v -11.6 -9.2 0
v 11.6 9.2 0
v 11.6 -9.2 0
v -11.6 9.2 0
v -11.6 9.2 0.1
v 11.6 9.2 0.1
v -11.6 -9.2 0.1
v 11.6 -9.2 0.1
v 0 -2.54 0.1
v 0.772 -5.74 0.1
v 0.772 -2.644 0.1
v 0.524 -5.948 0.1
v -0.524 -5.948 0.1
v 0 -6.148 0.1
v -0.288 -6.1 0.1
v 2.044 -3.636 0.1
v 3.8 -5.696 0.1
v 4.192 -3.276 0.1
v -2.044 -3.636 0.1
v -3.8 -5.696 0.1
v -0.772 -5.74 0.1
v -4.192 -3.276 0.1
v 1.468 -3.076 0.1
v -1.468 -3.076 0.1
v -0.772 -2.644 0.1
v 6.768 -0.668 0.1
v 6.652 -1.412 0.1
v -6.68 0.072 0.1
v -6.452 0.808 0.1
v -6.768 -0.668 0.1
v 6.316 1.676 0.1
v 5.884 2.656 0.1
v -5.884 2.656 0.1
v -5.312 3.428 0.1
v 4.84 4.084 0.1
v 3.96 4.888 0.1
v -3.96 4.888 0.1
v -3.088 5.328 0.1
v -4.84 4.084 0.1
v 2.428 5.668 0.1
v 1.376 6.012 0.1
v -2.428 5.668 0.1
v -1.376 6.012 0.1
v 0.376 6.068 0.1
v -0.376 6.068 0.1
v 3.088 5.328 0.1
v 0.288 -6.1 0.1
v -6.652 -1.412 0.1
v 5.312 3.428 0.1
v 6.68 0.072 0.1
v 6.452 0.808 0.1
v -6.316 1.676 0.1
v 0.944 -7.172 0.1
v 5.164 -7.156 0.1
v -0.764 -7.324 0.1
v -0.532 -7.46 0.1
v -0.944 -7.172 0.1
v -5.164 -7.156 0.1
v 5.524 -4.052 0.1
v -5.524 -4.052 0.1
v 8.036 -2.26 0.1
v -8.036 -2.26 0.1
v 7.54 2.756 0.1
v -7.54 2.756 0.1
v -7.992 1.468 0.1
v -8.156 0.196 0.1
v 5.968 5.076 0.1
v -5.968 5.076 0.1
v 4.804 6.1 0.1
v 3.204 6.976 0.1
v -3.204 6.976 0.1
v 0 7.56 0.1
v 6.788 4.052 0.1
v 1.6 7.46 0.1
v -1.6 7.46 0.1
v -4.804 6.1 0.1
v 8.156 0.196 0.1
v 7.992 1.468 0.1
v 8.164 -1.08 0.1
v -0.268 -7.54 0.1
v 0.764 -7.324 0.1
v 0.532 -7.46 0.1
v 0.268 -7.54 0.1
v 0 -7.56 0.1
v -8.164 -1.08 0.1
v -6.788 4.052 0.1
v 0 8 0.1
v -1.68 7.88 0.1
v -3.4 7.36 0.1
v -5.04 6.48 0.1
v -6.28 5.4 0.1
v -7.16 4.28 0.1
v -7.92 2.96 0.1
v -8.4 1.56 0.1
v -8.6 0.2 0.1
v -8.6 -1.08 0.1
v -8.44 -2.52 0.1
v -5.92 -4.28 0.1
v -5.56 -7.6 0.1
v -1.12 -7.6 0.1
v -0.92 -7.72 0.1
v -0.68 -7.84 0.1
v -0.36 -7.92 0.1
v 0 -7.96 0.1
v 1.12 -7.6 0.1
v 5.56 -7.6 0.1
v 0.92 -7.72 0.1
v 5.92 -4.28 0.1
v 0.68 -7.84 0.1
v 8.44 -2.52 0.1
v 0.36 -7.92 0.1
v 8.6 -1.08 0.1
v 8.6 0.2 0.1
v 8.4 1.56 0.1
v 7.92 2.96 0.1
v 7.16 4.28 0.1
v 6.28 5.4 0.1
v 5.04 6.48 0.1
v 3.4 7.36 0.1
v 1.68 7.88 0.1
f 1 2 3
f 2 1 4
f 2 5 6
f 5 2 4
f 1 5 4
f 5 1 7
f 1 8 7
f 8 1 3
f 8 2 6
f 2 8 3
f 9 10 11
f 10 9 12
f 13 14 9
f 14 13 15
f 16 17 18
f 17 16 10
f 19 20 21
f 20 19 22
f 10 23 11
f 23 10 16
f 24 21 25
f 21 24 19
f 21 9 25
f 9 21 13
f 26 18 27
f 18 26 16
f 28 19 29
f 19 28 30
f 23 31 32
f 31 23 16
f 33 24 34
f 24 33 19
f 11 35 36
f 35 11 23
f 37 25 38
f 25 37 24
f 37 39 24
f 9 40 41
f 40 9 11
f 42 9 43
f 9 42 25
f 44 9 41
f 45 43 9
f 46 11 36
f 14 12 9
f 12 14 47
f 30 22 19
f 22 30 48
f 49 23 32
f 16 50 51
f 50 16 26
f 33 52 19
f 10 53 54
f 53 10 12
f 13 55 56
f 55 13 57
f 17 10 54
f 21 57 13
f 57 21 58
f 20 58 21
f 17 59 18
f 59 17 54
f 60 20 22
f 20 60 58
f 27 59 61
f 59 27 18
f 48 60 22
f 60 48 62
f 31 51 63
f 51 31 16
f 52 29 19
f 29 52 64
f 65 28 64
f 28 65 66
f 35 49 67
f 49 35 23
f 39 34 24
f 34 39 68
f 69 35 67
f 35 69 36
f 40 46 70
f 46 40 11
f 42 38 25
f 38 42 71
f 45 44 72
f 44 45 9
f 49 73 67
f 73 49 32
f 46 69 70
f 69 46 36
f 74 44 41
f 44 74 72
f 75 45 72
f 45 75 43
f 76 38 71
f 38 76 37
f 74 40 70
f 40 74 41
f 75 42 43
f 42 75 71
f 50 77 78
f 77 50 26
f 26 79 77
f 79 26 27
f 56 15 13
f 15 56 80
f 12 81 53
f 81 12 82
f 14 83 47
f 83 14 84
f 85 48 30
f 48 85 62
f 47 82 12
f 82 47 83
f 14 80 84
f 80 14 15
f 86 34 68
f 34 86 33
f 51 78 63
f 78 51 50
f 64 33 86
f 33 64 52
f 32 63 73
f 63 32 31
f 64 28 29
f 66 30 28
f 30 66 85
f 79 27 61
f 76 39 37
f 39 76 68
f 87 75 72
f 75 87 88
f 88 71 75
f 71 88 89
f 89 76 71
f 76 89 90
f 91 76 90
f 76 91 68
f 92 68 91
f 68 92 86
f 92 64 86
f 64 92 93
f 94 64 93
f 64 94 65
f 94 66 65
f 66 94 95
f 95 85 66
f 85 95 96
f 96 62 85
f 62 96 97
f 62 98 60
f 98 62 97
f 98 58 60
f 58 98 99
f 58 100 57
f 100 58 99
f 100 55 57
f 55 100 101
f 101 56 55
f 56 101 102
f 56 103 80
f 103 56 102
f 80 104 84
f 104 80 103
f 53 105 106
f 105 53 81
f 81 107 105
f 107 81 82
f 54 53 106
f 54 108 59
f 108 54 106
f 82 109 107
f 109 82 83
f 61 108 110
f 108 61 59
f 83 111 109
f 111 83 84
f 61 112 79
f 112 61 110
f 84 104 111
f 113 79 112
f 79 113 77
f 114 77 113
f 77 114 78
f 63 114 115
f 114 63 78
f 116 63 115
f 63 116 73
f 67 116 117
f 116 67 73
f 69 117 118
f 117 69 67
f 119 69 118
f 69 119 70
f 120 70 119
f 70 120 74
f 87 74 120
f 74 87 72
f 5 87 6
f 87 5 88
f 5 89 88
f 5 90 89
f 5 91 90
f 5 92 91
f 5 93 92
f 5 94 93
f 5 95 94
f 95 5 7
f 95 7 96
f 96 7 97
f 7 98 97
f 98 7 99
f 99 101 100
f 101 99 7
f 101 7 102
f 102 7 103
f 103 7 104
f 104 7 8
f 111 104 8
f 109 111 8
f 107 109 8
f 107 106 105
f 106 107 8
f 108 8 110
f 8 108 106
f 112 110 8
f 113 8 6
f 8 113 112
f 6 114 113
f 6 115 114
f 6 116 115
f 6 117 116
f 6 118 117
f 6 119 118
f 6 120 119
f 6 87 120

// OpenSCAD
// file: ../p/box5-12.scad
use <../lib.scad>
function ldraw_lib__box5_12() = [
// 0 Box with 5 Faces without Any Edges
// 0 Name: box5-12.dat
// 0 Author: Chris Dee [cwdee]
// 0 !LDRAW_ORG Primitive UPDATE 2009-02
// 0 !LICENSE Licensed under CC BY 2.0 and CC BY 4.0 : see CAreadme.txt
// 
// 0 BFC CERTIFY CCW
  [0,"BFC","CERTIFY"],
  [0,"BFC","CCW"],
// 
// 0 !HISTORY 2009-09-03 [PTadmin] Official Update 2009-02
// 
// 
// 4 16 1 1 1 1 1 -1 -1 1 -1 -1 1 1
  [4,16,1,1,1,1,1,-1,-1,1,-1,-1,1,1],
// 4 16 -1 0 1 1 0 1 1 1 1 -1 1 1
  [4,16,-1,0,1,1,0,1,1,1,1,-1,1,1],
// 4 16 -1 0 -1 -1 0 1 -1 1 1 -1 1 -1
  [4,16,-1,0,-1,-1,0,1,-1,1,1,-1,1,-1],
// 4 16 1 0 -1 -1 0 -1 -1 1 -1 1 1 -1
  [4,16,1,0,-1,-1,0,-1,-1,1,-1,1,1,-1],
// 4 16 1 0 1 1 0 -1 1 1 -1 1 1 1
  [4,16,1,0,1,1,0,-1,1,1,-1,1,1,1],
// 0
];
makepoly(ldraw_lib__box5_12(), line=0.2);
// main file
use <../lib.scad>
use <../p/box5-12.scad>
function ldraw_lib__190155i() = [
// 0 Sticker  2.3 x  2.9 with Shell Logo on Red Background
// 0 Name: 190155i.dat
// 0 Author: Takeshi Takahashi [RainbowDolphin]
// 0 !LDRAW_ORG Part UPDATE 2022-06
// 0 !LICENSE Licensed under CC BY 2.0 and CC BY 4.0 : see CAreadme.txt
// 
// 0 BFC CERTIFY CCW
  [0,"BFC","CERTIFY"],
  [0,"BFC","CCW"],
// 
// 0 !KEYWORDS Bricklink 6378stk01, Brickowl 150076, Rebrickable 190155
// 0 !KEYWORDS Service station, Set 6378, Signboard
// 
// 0 !HISTORY 2022-12-20 [PTadmin] Official Update 2022-06
// 
// 
// 1 16 0 -0.25 0 29 0 0 0 0.25 0 0 0 23 box5-12.dat
  [1,16,0,-0.25,0,29,0,0,0,0.25,0,0,0,23, ldraw_lib__box5_12()],
// 4 14 0 -0.25 -6.35 1.31 -0.25 -14.87 1.93 -0.25 -14.35 1.93 -0.25 -6.61
  [4,14,0,-0.25,-6.35,1.31,-0.25,-14.87,1.93,-0.25,-14.35,1.93,-0.25,-6.61],
// 4 14 -0.72 -0.25 -15.25 0 -0.25 -15.37 0 -0.25 -6.35 -1.31 -0.25 -14.87
  [4,14,-0.72,-0.25,-15.25,0,-0.25,-15.37,0,-0.25,-6.35,-1.31,-0.25,-14.87],
// 4 14 9.5 -0.25 -14.24 10.48 -0.25 -8.189 5.11 -0.25 -9.09 1.93 -0.25 -14.35
  [4,14,9.5,-0.25,-14.24,10.48,-0.25,-8.189,5.11,-0.25,-9.09,1.93,-0.25,-14.35],
// 4 14 -10.48 -0.25 -8.189 -9.5 -0.25 -14.24 -1.93 -0.25 -14.35 -5.11 -0.25 -9.09
  [4,14,-10.48,-0.25,-8.189,-9.5,-0.25,-14.24,-1.93,-0.25,-14.35,-5.11,-0.25,-9.09],
// 4 14 1.93 -0.25 -14.35 5.11 -0.25 -9.09 3.67 -0.25 -7.69 1.93 -0.25 -6.61
  [4,14,1.93,-0.25,-14.35,5.11,-0.25,-9.09,3.67,-0.25,-7.69,1.93,-0.25,-6.61],
// 4 14 -3.67 -0.25 -7.69 -5.11 -0.25 -9.09 -1.93 -0.25 -14.35 -1.93 -0.25 -6.61
  [4,14,-3.67,-0.25,-7.69,-5.11,-0.25,-9.09,-1.93,-0.25,-14.35,-1.93,-0.25,-6.61],
// 4 14 0 -0.25 -6.35 -1.93 -0.25 -6.61 -1.93 -0.25 -14.35 -1.31 -0.25 -14.87
  [4,14,0,-0.25,-6.35,-1.93,-0.25,-6.61,-1.93,-0.25,-14.35,-1.31,-0.25,-14.87],
// 4 14 5.11 -0.25 -9.09 10.48 -0.25 -8.189 16.63 -0.25 -3.53 16.92 -0.25 -1.67
  [4,14,5.11,-0.25,-9.09,10.48,-0.25,-8.189,16.63,-0.25,-3.53,16.92,-0.25,-1.67],
// 4 14 -5.11 -0.25 -9.09 -16.129 -0.25 2.02 -16.7 -0.25 0.18 -16.92 -0.25 -1.67
  [4,14,-5.11,-0.25,-9.09,-16.129,-0.25,2.02,-16.7,-0.25,0.18,-16.92,-0.25,-1.67],
// 4 14 3.67 -0.25 -7.69 5.11 -0.25 -9.09 15.79 -0.25 4.19 14.71 -0.25 6.64
  [4,14,3.67,-0.25,-7.69,5.11,-0.25,-9.09,15.79,-0.25,4.19,14.71,-0.25,6.64],
// 4 14 -3.67 -0.25 -7.69 -13.28 -0.25 8.57 -14.71 -0.25 6.64 -5.11 -0.25 -9.09
  [4,14,-3.67,-0.25,-7.69,-13.28,-0.25,8.57,-14.71,-0.25,6.64,-5.11,-0.25,-9.09],
// 4 14 1.93 -0.25 -6.61 3.67 -0.25 -7.69 12.1 -0.25 10.21 9.9 -0.25 12.22
  [4,14,1.93,-0.25,-6.61,3.67,-0.25,-7.69,12.1,-0.25,10.21,9.9,-0.25,12.22],
// 4 14 -1.93 -0.25 -6.61 -7.72 -0.25 13.32 -9.9 -0.25 12.22 -3.67 -0.25 -7.69
  [4,14,-1.93,-0.25,-6.61,-7.72,-0.25,13.32,-9.9,-0.25,12.22,-3.67,-0.25,-7.69],
// 3 14 -9.9 -0.25 12.22 -12.1 -0.25 10.21 -3.67 -0.25 -7.69
  [3,14,-9.9,-0.25,12.22,-12.1,-0.25,10.21,-3.67,-0.25,-7.69],
// 4 14 0 -0.25 -6.35 1.93 -0.25 -6.61 6.07 -0.25 14.17 3.44 -0.25 15.03
  [4,14,0,-0.25,-6.35,1.93,-0.25,-6.61,6.07,-0.25,14.17,3.44,-0.25,15.03],
// 4 14 -6.07 -0.25 14.17 -1.93 -0.25 -6.61 0 -0.25 -6.35 -3.44 -0.25 15.03
  [4,14,-6.07,-0.25,14.17,-1.93,-0.25,-6.61,0,-0.25,-6.35,-3.44,-0.25,15.03],
// 3 14 0.94 -0.25 15.17 0 -0.25 -6.35 3.44 -0.25 15.03
  [3,14,0.94,-0.25,15.17,0,-0.25,-6.35,3.44,-0.25,15.03],
// 3 14 -0.94 -0.25 15.17 -3.44 -0.25 15.03 0 -0.25 -6.35
  [3,14,-0.94,-0.25,15.17,-3.44,-0.25,15.03,0,-0.25,-6.35],
// 3 14 7.72 -0.25 13.32 1.93 -0.25 -6.61 9.9 -0.25 12.22
  [3,14,7.72,-0.25,13.32,1.93,-0.25,-6.61,9.9,-0.25,12.22],
// 4 14 0.72 -0.25 -15.25 1.31 -0.25 -14.87 0 -0.25 -6.35 0 -0.25 -15.37
  [4,14,0.72,-0.25,-15.25,1.31,-0.25,-14.87,0,-0.25,-6.35,0,-0.25,-15.37],
// 4 14 -5.11 -0.25 -9.09 -16.92 -0.25 -1.67 -16.63 -0.25 -3.53 -10.48 -0.25 -8.189
  [4,14,-5.11,-0.25,-9.09,-16.92,-0.25,-1.67,-16.63,-0.25,-3.53,-10.48,-0.25,-8.189],
// 3 14 13.28 -0.25 8.57 3.67 -0.25 -7.69 14.71 -0.25 6.64
  [3,14,13.28,-0.25,8.57,3.67,-0.25,-7.69,14.71,-0.25,6.64],
// 4 14 16.7 -0.25 0.18 16.129 -0.25 2.02 5.11 -0.25 -9.09 16.92 -0.25 -1.67
  [4,14,16.7,-0.25,0.18,16.129,-0.25,2.02,5.11,-0.25,-9.09,16.92,-0.25,-1.67],
// 3 14 -14.71 -0.25 6.64 -15.79 -0.25 4.19 -5.11 -0.25 -9.09
  [3,14,-14.71,-0.25,6.64,-15.79,-0.25,4.19,-5.11,-0.25,-9.09],
// 4 4 1.93 -0.25 -14.35 1.31 -0.25 -14.87 2.36 -0.25 -17.93 12.91 -0.25 -17.89
  [4,4,1.93,-0.25,-14.35,1.31,-0.25,-14.87,2.36,-0.25,-17.93,12.91,-0.25,-17.89],
// 4 4 -1.91 -0.25 -18.31 -1.33 -0.25 -18.65 -1.31 -0.25 -14.87 -2.36 -0.25 -17.93
  [4,4,-1.91,-0.25,-18.31,-1.33,-0.25,-18.65,-1.31,-0.25,-14.87,-2.36,-0.25,-17.93],
// 3 4 9.5 -0.25 -14.24 1.93 -0.25 -14.35 12.91 -0.25 -17.89
  [3,4,9.5,-0.25,-14.24,1.93,-0.25,-14.35,12.91,-0.25,-17.89],
// 4 4 -1.31 -0.25 -14.87 -1.93 -0.25 -14.35 -12.91 -0.25 -17.89 -2.36 -0.25 -17.93
  [4,4,-1.31,-0.25,-14.87,-1.93,-0.25,-14.35,-12.91,-0.25,-17.89,-2.36,-0.25,-17.93],
// 3 4 -9.5 -0.25 -14.24 -12.91 -0.25 -17.89 -1.93 -0.25 -14.35
  [3,4,-9.5,-0.25,-14.24,-12.91,-0.25,-17.89,-1.93,-0.25,-14.35],
// 4 4 13.81 -0.25 -10.13 10.48 -0.25 -8.189 9.5 -0.25 -14.24 12.91 -0.25 -17.89
  [4,4,13.81,-0.25,-10.13,10.48,-0.25,-8.189,9.5,-0.25,-14.24,12.91,-0.25,-17.89],
// 4 4 -10.48 -0.25 -8.189 -13.81 -0.25 -10.13 -12.91 -0.25 -17.89 -9.5 -0.25 -14.24
  [4,4,-10.48,-0.25,-8.189,-13.81,-0.25,-10.13,-12.91,-0.25,-17.89,-9.5,-0.25,-14.24],
// 4 4 20.09 -0.25 -5.65 16.63 -0.25 -3.53 10.48 -0.25 -8.189 13.81 -0.25 -10.13
  [4,4,20.09,-0.25,-5.65,16.63,-0.25,-3.53,10.48,-0.25,-8.189,13.81,-0.25,-10.13],
// 4 4 -10.48 -0.25 -8.189 -16.63 -0.25 -3.53 -20.09 -0.25 -5.65 -13.81 -0.25 -10.13
  [4,4,-10.48,-0.25,-8.189,-16.63,-0.25,-3.53,-20.09,-0.25,-5.65,-13.81,-0.25,-10.13],
// 4 4 15.79 -0.25 4.19 5.11 -0.25 -9.09 16.129 -0.25 2.02 18.85 -0.25 6.89
  [4,4,15.79,-0.25,4.19,5.11,-0.25,-9.09,16.129,-0.25,2.02,18.85,-0.25,6.89],
// 4 4 -16.129 -0.25 2.02 -5.11 -0.25 -9.09 -15.79 -0.25 4.19 -18.85 -0.25 6.89
  [4,4,-16.129,-0.25,2.02,-5.11,-0.25,-9.09,-15.79,-0.25,4.19,-18.85,-0.25,6.89],
// 4 4 -19.98 -0.25 3.67 -20.39 -0.25 0.49 -16.7 -0.25 0.18 -18.85 -0.25 6.89
  [4,4,-19.98,-0.25,3.67,-20.39,-0.25,0.49,-16.7,-0.25,0.18,-18.85,-0.25,6.89],
// 4 4 12.1 -0.25 10.21 3.67 -0.25 -7.69 13.28 -0.25 8.57 14.92 -0.25 12.69
  [4,4,12.1,-0.25,10.21,3.67,-0.25,-7.69,13.28,-0.25,8.57,14.92,-0.25,12.69],
// 4 4 -13.28 -0.25 8.57 -3.67 -0.25 -7.69 -12.1 -0.25 10.21 -14.92 -0.25 12.69
  [4,4,-13.28,-0.25,8.57,-3.67,-0.25,-7.69,-12.1,-0.25,10.21,-14.92,-0.25,12.69],
// 4 4 12.1 -0.25 10.21 14.92 -0.25 12.69 12.01 -0.25 15.25 9.9 -0.25 12.22
  [4,4,12.1,-0.25,10.21,14.92,-0.25,12.69,12.01,-0.25,15.25,9.9,-0.25,12.22],
// 4 4 6.07 -0.25 14.17 1.93 -0.25 -6.61 7.72 -0.25 13.32 8.01 -0.25 17.44
  [4,4,6.07,-0.25,14.17,1.93,-0.25,-6.61,7.72,-0.25,13.32,8.01,-0.25,17.44],
// 4 4 -7.72 -0.25 13.32 -1.93 -0.25 -6.61 -6.07 -0.25 14.17 -8.01 -0.25 17.44
  [4,4,-7.72,-0.25,13.32,-1.93,-0.25,-6.61,-6.07,-0.25,14.17,-8.01,-0.25,17.44],
// 4 4 0 -0.25 -6.35 0.94 -0.25 15.17 0 -0.25 18.9 -0.94 -0.25 15.17
  [4,4,0,-0.25,-6.35,0.94,-0.25,15.17,0,-0.25,18.9,-0.94,-0.25,15.17],
// 4 4 16.97 -0.25 10.13 14.92 -0.25 12.69 13.28 -0.25 8.57 14.71 -0.25 6.64
  [4,4,16.97,-0.25,10.13,14.92,-0.25,12.69,13.28,-0.25,8.57,14.71,-0.25,6.64],
// 4 4 12.01 -0.25 15.25 8.01 -0.25 17.44 7.72 -0.25 13.32 9.9 -0.25 12.22
  [4,4,12.01,-0.25,15.25,8.01,-0.25,17.44,7.72,-0.25,13.32,9.9,-0.25,12.22],
// 4 4 0 -0.25 18.9 0.94 -0.25 15.17 3.44 -0.25 15.03 4 -0.25 18.65
  [4,4,0,-0.25,18.9,0.94,-0.25,15.17,3.44,-0.25,15.03,4,-0.25,18.65],
// 4 4 -3.44 -0.25 15.03 -0.94 -0.25 15.17 0 -0.25 18.9 -4 -0.25 18.65
  [4,4,-3.44,-0.25,15.03,-0.94,-0.25,15.17,0,-0.25,18.9,-4,-0.25,18.65],
// 4 4 -7.72 -0.25 13.32 -8.01 -0.25 17.44 -12.01 -0.25 15.25 -9.9 -0.25 12.22
  [4,4,-7.72,-0.25,13.32,-8.01,-0.25,17.44,-12.01,-0.25,15.25,-9.9,-0.25,12.22],
// 4 4 4 -0.25 18.65 3.44 -0.25 15.03 6.07 -0.25 14.17 8.01 -0.25 17.44
  [4,4,4,-0.25,18.65,3.44,-0.25,15.03,6.07,-0.25,14.17,8.01,-0.25,17.44],
// 4 4 -6.07 -0.25 14.17 -3.44 -0.25 15.03 -4 -0.25 18.65 -8.01 -0.25 17.44
  [4,4,-6.07,-0.25,14.17,-3.44,-0.25,15.03,-4,-0.25,18.65,-8.01,-0.25,17.44],
// 4 4 20.39 -0.25 0.49 19.98 -0.25 3.67 16.7 -0.25 0.18 16.92 -0.25 -1.67
  [4,4,20.39,-0.25,0.49,19.98,-0.25,3.67,16.7,-0.25,0.18,16.92,-0.25,-1.67],
// 4 4 20.41 -0.25 -2.7 20.39 -0.25 0.49 16.92 -0.25 -1.67 16.63 -0.25 -3.53
  [4,4,20.41,-0.25,-2.7,20.39,-0.25,0.49,16.92,-0.25,-1.67,16.63,-0.25,-3.53],
// 4 4 -0.67 -0.25 -18.85 -0.72 -0.25 -15.25 -1.31 -0.25 -14.87 -1.33 -0.25 -18.65
  [4,4,-0.67,-0.25,-18.85,-0.72,-0.25,-15.25,-1.31,-0.25,-14.87,-1.33,-0.25,-18.65],
// 4 4 1.31 -0.25 -14.87 1.33 -0.25 -18.65 1.91 -0.25 -18.31 2.36 -0.25 -17.93
  [4,4,1.31,-0.25,-14.87,1.33,-0.25,-18.65,1.91,-0.25,-18.31,2.36,-0.25,-17.93],
// 4 4 0.67 -0.25 -18.85 0.72 -0.25 -15.25 0 -0.25 -15.37 0 -0.25 -18.9
  [4,4,0.67,-0.25,-18.85,0.72,-0.25,-15.25,0,-0.25,-15.37,0,-0.25,-18.9],
// 4 4 -16.92 -0.25 -1.67 -20.41 -0.25 -2.7 -20.09 -0.25 -5.65 -16.63 -0.25 -3.53
  [4,4,-16.92,-0.25,-1.67,-20.41,-0.25,-2.7,-20.09,-0.25,-5.65,-16.63,-0.25,-3.53],
// 4 4 1.31 -0.25 -14.87 0.72 -0.25 -15.25 0.67 -0.25 -18.85 1.33 -0.25 -18.65
  [4,4,1.31,-0.25,-14.87,0.72,-0.25,-15.25,0.67,-0.25,-18.85,1.33,-0.25,-18.65],
// 4 4 0 -0.25 -15.37 -0.72 -0.25 -15.25 -0.67 -0.25 -18.85 0 -0.25 -18.9
  [4,4,0,-0.25,-15.37,-0.72,-0.25,-15.25,-0.67,-0.25,-18.85,0,-0.25,-18.9],
// 4 4 -13.28 -0.25 8.57 -14.92 -0.25 12.69 -16.97 -0.25 10.13 -14.71 -0.25 6.64
  [4,4,-13.28,-0.25,8.57,-14.92,-0.25,12.69,-16.97,-0.25,10.13,-14.71,-0.25,6.64],
// 4 4 19.98 -0.25 3.67 18.85 -0.25 6.89 16.129 -0.25 2.02 16.7 -0.25 0.18
  [4,4,19.98,-0.25,3.67,18.85,-0.25,6.89,16.129,-0.25,2.02,16.7,-0.25,0.18],
// 4 4 -16.97 -0.25 10.13 -18.85 -0.25 6.89 -15.79 -0.25 4.19 -14.71 -0.25 6.64
  [4,4,-16.97,-0.25,10.13,-18.85,-0.25,6.89,-15.79,-0.25,4.19,-14.71,-0.25,6.64],
// 4 4 15.79 -0.25 4.19 18.85 -0.25 6.89 16.97 -0.25 10.13 14.71 -0.25 6.64
  [4,4,15.79,-0.25,4.19,18.85,-0.25,6.89,16.97,-0.25,10.13,14.71,-0.25,6.64],
// 3 4 -18.85 -0.25 6.89 -16.7 -0.25 0.18 -16.129 -0.25 2.02
  [3,4,-18.85,-0.25,6.89,-16.7,-0.25,0.18,-16.129,-0.25,2.02],
// 4 4 -16.92 -0.25 -1.67 -16.7 -0.25 0.18 -20.39 -0.25 0.49 -20.41 -0.25 -2.7
  [4,4,-16.92,-0.25,-1.67,-16.7,-0.25,0.18,-20.39,-0.25,0.49,-20.41,-0.25,-2.7],
// 3 4 20.41 -0.25 -2.7 16.63 -0.25 -3.53 20.09 -0.25 -5.65
  [3,4,20.41,-0.25,-2.7,16.63,-0.25,-3.53,20.09,-0.25,-5.65],
// 4 4 -12.01 -0.25 15.25 -14.92 -0.25 12.69 -12.1 -0.25 10.21 -9.9 -0.25 12.22
  [4,4,-12.01,-0.25,15.25,-14.92,-0.25,12.69,-12.1,-0.25,10.21,-9.9,-0.25,12.22],
// 4 15 -4 -0.25 18.65 0 -0.25 18.9 0 -0.25 20 -4.2 -0.25 19.7
  [4,15,-4,-0.25,18.65,0,-0.25,18.9,0,-0.25,20,-4.2,-0.25,19.7],
// 4 15 -8.01 -0.25 17.44 -4 -0.25 18.65 -4.2 -0.25 19.7 -8.5 -0.25 18.4
  [4,15,-8.01,-0.25,17.44,-4,-0.25,18.65,-4.2,-0.25,19.7,-8.5,-0.25,18.4],
// 4 15 -12.01 -0.25 15.25 -8.01 -0.25 17.44 -8.5 -0.25 18.4 -12.6 -0.25 16.2
  [4,15,-12.01,-0.25,15.25,-8.01,-0.25,17.44,-8.5,-0.25,18.4,-12.6,-0.25,16.2],
// 4 15 -14.92 -0.25 12.69 -12.01 -0.25 15.25 -12.6 -0.25 16.2 -15.7 -0.25 13.5
  [4,15,-14.92,-0.25,12.69,-12.01,-0.25,15.25,-12.6,-0.25,16.2,-15.7,-0.25,13.5],
// 4 15 -16.97 -0.25 10.13 -14.92 -0.25 12.69 -15.7 -0.25 13.5 -17.9 -0.25 10.7
  [4,15,-16.97,-0.25,10.13,-14.92,-0.25,12.69,-15.7,-0.25,13.5,-17.9,-0.25,10.7],
// 4 15 -18.85 -0.25 6.89 -16.97 -0.25 10.13 -17.9 -0.25 10.7 -19.8 -0.25 7.4
  [4,15,-18.85,-0.25,6.89,-16.97,-0.25,10.13,-17.9,-0.25,10.7,-19.8,-0.25,7.4],
// 4 15 -19.98 -0.25 3.67 -18.85 -0.25 6.89 -19.8 -0.25 7.4 -21 -0.25 3.9
  [4,15,-19.98,-0.25,3.67,-18.85,-0.25,6.89,-19.8,-0.25,7.4,-21,-0.25,3.9],
// 4 15 -20.39 -0.25 0.49 -19.98 -0.25 3.67 -21 -0.25 3.9 -21.5 -0.25 0.5
  [4,15,-20.39,-0.25,0.49,-19.98,-0.25,3.67,-21,-0.25,3.9,-21.5,-0.25,0.5],
// 4 15 -20.41 -0.25 -2.7 -20.39 -0.25 0.49 -21.5 -0.25 0.5 -21.5 -0.25 -2.7
  [4,15,-20.41,-0.25,-2.7,-20.39,-0.25,0.49,-21.5,-0.25,0.5,-21.5,-0.25,-2.7],
// 4 15 -20.09 -0.25 -5.65 -20.41 -0.25 -2.7 -21.5 -0.25 -2.7 -21.1 -0.25 -6.3
  [4,15,-20.09,-0.25,-5.65,-20.41,-0.25,-2.7,-21.5,-0.25,-2.7,-21.1,-0.25,-6.3],
// 4 15 -13.81 -0.25 -10.13 -20.09 -0.25 -5.65 -21.1 -0.25 -6.3 -14.8 -0.25 -10.7
  [4,15,-13.81,-0.25,-10.13,-20.09,-0.25,-5.65,-21.1,-0.25,-6.3,-14.8,-0.25,-10.7],
// 4 15 -12.91 -0.25 -17.89 -13.81 -0.25 -10.13 -14.8 -0.25 -10.7 -13.9 -0.25 -19
  [4,15,-12.91,-0.25,-17.89,-13.81,-0.25,-10.13,-14.8,-0.25,-10.7,-13.9,-0.25,-19],
// 4 15 -2.36 -0.25 -17.93 -12.91 -0.25 -17.89 -13.9 -0.25 -19 -2.8 -0.25 -19
  [4,15,-2.36,-0.25,-17.93,-12.91,-0.25,-17.89,-13.9,-0.25,-19,-2.8,-0.25,-19],
// 4 15 -1.91 -0.25 -18.31 -2.36 -0.25 -17.93 -2.8 -0.25 -19 -2.3 -0.25 -19.3
  [4,15,-1.91,-0.25,-18.31,-2.36,-0.25,-17.93,-2.8,-0.25,-19,-2.3,-0.25,-19.3],
// 4 15 -1.33 -0.25 -18.65 -1.91 -0.25 -18.31 -2.3 -0.25 -19.3 -1.7 -0.25 -19.6
  [4,15,-1.33,-0.25,-18.65,-1.91,-0.25,-18.31,-2.3,-0.25,-19.3,-1.7,-0.25,-19.6],
// 4 15 -0.67 -0.25 -18.85 -1.33 -0.25 -18.65 -1.7 -0.25 -19.6 -0.9 -0.25 -19.8
  [4,15,-0.67,-0.25,-18.85,-1.33,-0.25,-18.65,-1.7,-0.25,-19.6,-0.9,-0.25,-19.8],
// 4 15 0 -0.25 -18.9 -0.67 -0.25 -18.85 -0.9 -0.25 -19.8 0 -0.25 -19.9
  [4,15,0,-0.25,-18.9,-0.67,-0.25,-18.85,-0.9,-0.25,-19.8,0,-0.25,-19.9],
// 4 15 2.8 -0.25 -19 13.9 -0.25 -19 2.36 -0.25 -17.93 1.91 -0.25 -18.31
  [4,15,2.8,-0.25,-19,13.9,-0.25,-19,2.36,-0.25,-17.93,1.91,-0.25,-18.31],
// 4 15 2.3 -0.25 -19.3 2.8 -0.25 -19 1.91 -0.25 -18.31 1.33 -0.25 -18.65
  [4,15,2.3,-0.25,-19.3,2.8,-0.25,-19,1.91,-0.25,-18.31,1.33,-0.25,-18.65],
// 3 15 12.91 -0.25 -17.89 2.36 -0.25 -17.93 13.9 -0.25 -19
  [3,15,12.91,-0.25,-17.89,2.36,-0.25,-17.93,13.9,-0.25,-19],
// 4 15 12.91 -0.25 -17.89 13.9 -0.25 -19 14.8 -0.25 -10.7 13.81 -0.25 -10.13
  [4,15,12.91,-0.25,-17.89,13.9,-0.25,-19,14.8,-0.25,-10.7,13.81,-0.25,-10.13],
// 4 15 1.7 -0.25 -19.6 2.3 -0.25 -19.3 1.33 -0.25 -18.65 0.67 -0.25 -18.85
  [4,15,1.7,-0.25,-19.6,2.3,-0.25,-19.3,1.33,-0.25,-18.65,0.67,-0.25,-18.85],
// 4 15 13.81 -0.25 -10.13 14.8 -0.25 -10.7 21.1 -0.25 -6.3 20.09 -0.25 -5.65
  [4,15,13.81,-0.25,-10.13,14.8,-0.25,-10.7,21.1,-0.25,-6.3,20.09,-0.25,-5.65],
// 4 15 0.9 -0.25 -19.8 1.7 -0.25 -19.6 0.67 -0.25 -18.85 0 -0.25 -18.9
  [4,15,0.9,-0.25,-19.8,1.7,-0.25,-19.6,0.67,-0.25,-18.85,0,-0.25,-18.9],
// 4 15 20.09 -0.25 -5.65 21.1 -0.25 -6.3 21.5 -0.25 -2.7 20.41 -0.25 -2.7
  [4,15,20.09,-0.25,-5.65,21.1,-0.25,-6.3,21.5,-0.25,-2.7,20.41,-0.25,-2.7],
// 3 15 0 -0.25 -18.9 0 -0.25 -19.9 0.9 -0.25 -19.8
  [3,15,0,-0.25,-18.9,0,-0.25,-19.9,0.9,-0.25,-19.8],
// 4 15 20.41 -0.25 -2.7 21.5 -0.25 -2.7 21.5 -0.25 0.5 20.39 -0.25 0.49
  [4,15,20.41,-0.25,-2.7,21.5,-0.25,-2.7,21.5,-0.25,0.5,20.39,-0.25,0.49],
// 4 15 20.39 -0.25 0.49 21.5 -0.25 0.5 21 -0.25 3.9 19.98 -0.25 3.67
  [4,15,20.39,-0.25,0.49,21.5,-0.25,0.5,21,-0.25,3.9,19.98,-0.25,3.67],
// 4 15 19.98 -0.25 3.67 21 -0.25 3.9 19.8 -0.25 7.4 18.85 -0.25 6.89
  [4,15,19.98,-0.25,3.67,21,-0.25,3.9,19.8,-0.25,7.4,18.85,-0.25,6.89],
// 4 15 18.85 -0.25 6.89 19.8 -0.25 7.4 17.9 -0.25 10.7 16.97 -0.25 10.13
  [4,15,18.85,-0.25,6.89,19.8,-0.25,7.4,17.9,-0.25,10.7,16.97,-0.25,10.13],
// 4 15 16.97 -0.25 10.13 17.9 -0.25 10.7 15.7 -0.25 13.5 14.92 -0.25 12.69
  [4,15,16.97,-0.25,10.13,17.9,-0.25,10.7,15.7,-0.25,13.5,14.92,-0.25,12.69],
// 4 15 14.92 -0.25 12.69 15.7 -0.25 13.5 12.6 -0.25 16.2 12.01 -0.25 15.25
  [4,15,14.92,-0.25,12.69,15.7,-0.25,13.5,12.6,-0.25,16.2,12.01,-0.25,15.25],
// 4 15 12.01 -0.25 15.25 12.6 -0.25 16.2 8.5 -0.25 18.4 8.01 -0.25 17.44
  [4,15,12.01,-0.25,15.25,12.6,-0.25,16.2,8.5,-0.25,18.4,8.01,-0.25,17.44],
// 4 15 8.01 -0.25 17.44 8.5 -0.25 18.4 4.2 -0.25 19.7 4 -0.25 18.65
  [4,15,8.01,-0.25,17.44,8.5,-0.25,18.4,4.2,-0.25,19.7,4,-0.25,18.65],
// 4 15 4 -0.25 18.65 4.2 -0.25 19.7 0 -0.25 20 0 -0.25 18.9
  [4,15,4,-0.25,18.65,4.2,-0.25,19.7,0,-0.25,20,0,-0.25,18.9],
// 4 4 0 -0.25 20 29 -0.25 23 -29 -0.25 23 -4.2 -0.25 19.7
  [4,4,0,-0.25,20,29,-0.25,23,-29,-0.25,23,-4.2,-0.25,19.7],
// 3 4 -29 -0.25 23 -8.5 -0.25 18.4 -4.2 -0.25 19.7
  [3,4,-29,-0.25,23,-8.5,-0.25,18.4,-4.2,-0.25,19.7],
// 3 4 -29 -0.25 23 -12.6 -0.25 16.2 -8.5 -0.25 18.4
  [3,4,-29,-0.25,23,-12.6,-0.25,16.2,-8.5,-0.25,18.4],
// 3 4 -29 -0.25 23 -15.7 -0.25 13.5 -12.6 -0.25 16.2
  [3,4,-29,-0.25,23,-15.7,-0.25,13.5,-12.6,-0.25,16.2],
// 3 4 -29 -0.25 23 -17.9 -0.25 10.7 -15.7 -0.25 13.5
  [3,4,-29,-0.25,23,-17.9,-0.25,10.7,-15.7,-0.25,13.5],
// 3 4 -29 -0.25 23 -19.8 -0.25 7.4 -17.9 -0.25 10.7
  [3,4,-29,-0.25,23,-19.8,-0.25,7.4,-17.9,-0.25,10.7],
// 3 4 -29 -0.25 23 -21 -0.25 3.9 -19.8 -0.25 7.4
  [3,4,-29,-0.25,23,-21,-0.25,3.9,-19.8,-0.25,7.4],
// 4 4 -21.5 -0.25 0.5 -21 -0.25 3.9 -29 -0.25 23 -29 -0.25 -23
  [4,4,-21.5,-0.25,0.5,-21,-0.25,3.9,-29,-0.25,23,-29,-0.25,-23],
// 3 4 -21.5 -0.25 0.5 -29 -0.25 -23 -21.5 -0.25 -2.7
  [3,4,-21.5,-0.25,0.5,-29,-0.25,-23,-21.5,-0.25,-2.7],
// 3 4 -21.5 -0.25 -2.7 -29 -0.25 -23 -21.1 -0.25 -6.3
  [3,4,-21.5,-0.25,-2.7,-29,-0.25,-23,-21.1,-0.25,-6.3],
// 4 4 -14.8 -0.25 -10.7 -21.1 -0.25 -6.3 -29 -0.25 -23 -13.9 -0.25 -19
  [4,4,-14.8,-0.25,-10.7,-21.1,-0.25,-6.3,-29,-0.25,-23,-13.9,-0.25,-19],
// 4 4 -2.8 -0.25 -19 -13.9 -0.25 -19 -29 -0.25 -23 -2.3 -0.25 -19.3
  [4,4,-2.8,-0.25,-19,-13.9,-0.25,-19,-29,-0.25,-23,-2.3,-0.25,-19.3],
// 3 4 -2.3 -0.25 -19.3 -29 -0.25 -23 -1.7 -0.25 -19.6
  [3,4,-2.3,-0.25,-19.3,-29,-0.25,-23,-1.7,-0.25,-19.6],
// 3 4 -1.7 -0.25 -19.6 -29 -0.25 -23 -0.9 -0.25 -19.8
  [3,4,-1.7,-0.25,-19.6,-29,-0.25,-23,-0.9,-0.25,-19.8],
// 3 4 -0.9 -0.25 -19.8 -29 -0.25 -23 0 -0.25 -19.9
  [3,4,-0.9,-0.25,-19.8,-29,-0.25,-23,0,-0.25,-19.9],
// 3 4 0 -0.25 -19.9 -29 -0.25 -23 29 -0.25 -23
  [3,4,0,-0.25,-19.9,-29,-0.25,-23,29,-0.25,-23],
// 3 4 0.9 -0.25 -19.8 0 -0.25 -19.9 29 -0.25 -23
  [3,4,0.9,-0.25,-19.8,0,-0.25,-19.9,29,-0.25,-23],
// 3 4 1.7 -0.25 -19.6 0.9 -0.25 -19.8 29 -0.25 -23
  [3,4,1.7,-0.25,-19.6,0.9,-0.25,-19.8,29,-0.25,-23],
// 3 4 2.3 -0.25 -19.3 1.7 -0.25 -19.6 29 -0.25 -23
  [3,4,2.3,-0.25,-19.3,1.7,-0.25,-19.6,29,-0.25,-23],
// 4 4 2.8 -0.25 -19 2.3 -0.25 -19.3 29 -0.25 -23 13.9 -0.25 -19
  [4,4,2.8,-0.25,-19,2.3,-0.25,-19.3,29,-0.25,-23,13.9,-0.25,-19],
// 4 4 14.8 -0.25 -10.7 13.9 -0.25 -19 29 -0.25 -23 21.1 -0.25 -6.3
  [4,4,14.8,-0.25,-10.7,13.9,-0.25,-19,29,-0.25,-23,21.1,-0.25,-6.3],
// 3 4 21.5 -0.25 -2.7 21.1 -0.25 -6.3 29 -0.25 -23
  [3,4,21.5,-0.25,-2.7,21.1,-0.25,-6.3,29,-0.25,-23],
// 4 4 21.5 -0.25 0.5 21.5 -0.25 -2.7 29 -0.25 -23 29 -0.25 23
  [4,4,21.5,-0.25,0.5,21.5,-0.25,-2.7,29,-0.25,-23,29,-0.25,23],
// 3 4 29 -0.25 23 21 -0.25 3.9 21.5 -0.25 0.5
  [3,4,29,-0.25,23,21,-0.25,3.9,21.5,-0.25,0.5],
// 3 4 29 -0.25 23 19.8 -0.25 7.4 21 -0.25 3.9
  [3,4,29,-0.25,23,19.8,-0.25,7.4,21,-0.25,3.9],
// 3 4 29 -0.25 23 17.9 -0.25 10.7 19.8 -0.25 7.4
  [3,4,29,-0.25,23,17.9,-0.25,10.7,19.8,-0.25,7.4],
// 3 4 29 -0.25 23 15.7 -0.25 13.5 17.9 -0.25 10.7
  [3,4,29,-0.25,23,15.7,-0.25,13.5,17.9,-0.25,10.7],
// 3 4 29 -0.25 23 12.6 -0.25 16.2 15.7 -0.25 13.5
  [3,4,29,-0.25,23,12.6,-0.25,16.2,15.7,-0.25,13.5],
// 3 4 29 -0.25 23 8.5 -0.25 18.4 12.6 -0.25 16.2
  [3,4,29,-0.25,23,8.5,-0.25,18.4,12.6,-0.25,16.2],
// 3 4 29 -0.25 23 4.2 -0.25 19.7 8.5 -0.25 18.4
  [3,4,29,-0.25,23,4.2,-0.25,19.7,8.5,-0.25,18.4],
// 3 4 29 -0.25 23 0 -0.25 20 4.2 -0.25 19.7
  [3,4,29,-0.25,23,0,-0.25,20,4.2,-0.25,19.7],
];
makepoly(ldraw_lib__190155i(), line=0.2);
